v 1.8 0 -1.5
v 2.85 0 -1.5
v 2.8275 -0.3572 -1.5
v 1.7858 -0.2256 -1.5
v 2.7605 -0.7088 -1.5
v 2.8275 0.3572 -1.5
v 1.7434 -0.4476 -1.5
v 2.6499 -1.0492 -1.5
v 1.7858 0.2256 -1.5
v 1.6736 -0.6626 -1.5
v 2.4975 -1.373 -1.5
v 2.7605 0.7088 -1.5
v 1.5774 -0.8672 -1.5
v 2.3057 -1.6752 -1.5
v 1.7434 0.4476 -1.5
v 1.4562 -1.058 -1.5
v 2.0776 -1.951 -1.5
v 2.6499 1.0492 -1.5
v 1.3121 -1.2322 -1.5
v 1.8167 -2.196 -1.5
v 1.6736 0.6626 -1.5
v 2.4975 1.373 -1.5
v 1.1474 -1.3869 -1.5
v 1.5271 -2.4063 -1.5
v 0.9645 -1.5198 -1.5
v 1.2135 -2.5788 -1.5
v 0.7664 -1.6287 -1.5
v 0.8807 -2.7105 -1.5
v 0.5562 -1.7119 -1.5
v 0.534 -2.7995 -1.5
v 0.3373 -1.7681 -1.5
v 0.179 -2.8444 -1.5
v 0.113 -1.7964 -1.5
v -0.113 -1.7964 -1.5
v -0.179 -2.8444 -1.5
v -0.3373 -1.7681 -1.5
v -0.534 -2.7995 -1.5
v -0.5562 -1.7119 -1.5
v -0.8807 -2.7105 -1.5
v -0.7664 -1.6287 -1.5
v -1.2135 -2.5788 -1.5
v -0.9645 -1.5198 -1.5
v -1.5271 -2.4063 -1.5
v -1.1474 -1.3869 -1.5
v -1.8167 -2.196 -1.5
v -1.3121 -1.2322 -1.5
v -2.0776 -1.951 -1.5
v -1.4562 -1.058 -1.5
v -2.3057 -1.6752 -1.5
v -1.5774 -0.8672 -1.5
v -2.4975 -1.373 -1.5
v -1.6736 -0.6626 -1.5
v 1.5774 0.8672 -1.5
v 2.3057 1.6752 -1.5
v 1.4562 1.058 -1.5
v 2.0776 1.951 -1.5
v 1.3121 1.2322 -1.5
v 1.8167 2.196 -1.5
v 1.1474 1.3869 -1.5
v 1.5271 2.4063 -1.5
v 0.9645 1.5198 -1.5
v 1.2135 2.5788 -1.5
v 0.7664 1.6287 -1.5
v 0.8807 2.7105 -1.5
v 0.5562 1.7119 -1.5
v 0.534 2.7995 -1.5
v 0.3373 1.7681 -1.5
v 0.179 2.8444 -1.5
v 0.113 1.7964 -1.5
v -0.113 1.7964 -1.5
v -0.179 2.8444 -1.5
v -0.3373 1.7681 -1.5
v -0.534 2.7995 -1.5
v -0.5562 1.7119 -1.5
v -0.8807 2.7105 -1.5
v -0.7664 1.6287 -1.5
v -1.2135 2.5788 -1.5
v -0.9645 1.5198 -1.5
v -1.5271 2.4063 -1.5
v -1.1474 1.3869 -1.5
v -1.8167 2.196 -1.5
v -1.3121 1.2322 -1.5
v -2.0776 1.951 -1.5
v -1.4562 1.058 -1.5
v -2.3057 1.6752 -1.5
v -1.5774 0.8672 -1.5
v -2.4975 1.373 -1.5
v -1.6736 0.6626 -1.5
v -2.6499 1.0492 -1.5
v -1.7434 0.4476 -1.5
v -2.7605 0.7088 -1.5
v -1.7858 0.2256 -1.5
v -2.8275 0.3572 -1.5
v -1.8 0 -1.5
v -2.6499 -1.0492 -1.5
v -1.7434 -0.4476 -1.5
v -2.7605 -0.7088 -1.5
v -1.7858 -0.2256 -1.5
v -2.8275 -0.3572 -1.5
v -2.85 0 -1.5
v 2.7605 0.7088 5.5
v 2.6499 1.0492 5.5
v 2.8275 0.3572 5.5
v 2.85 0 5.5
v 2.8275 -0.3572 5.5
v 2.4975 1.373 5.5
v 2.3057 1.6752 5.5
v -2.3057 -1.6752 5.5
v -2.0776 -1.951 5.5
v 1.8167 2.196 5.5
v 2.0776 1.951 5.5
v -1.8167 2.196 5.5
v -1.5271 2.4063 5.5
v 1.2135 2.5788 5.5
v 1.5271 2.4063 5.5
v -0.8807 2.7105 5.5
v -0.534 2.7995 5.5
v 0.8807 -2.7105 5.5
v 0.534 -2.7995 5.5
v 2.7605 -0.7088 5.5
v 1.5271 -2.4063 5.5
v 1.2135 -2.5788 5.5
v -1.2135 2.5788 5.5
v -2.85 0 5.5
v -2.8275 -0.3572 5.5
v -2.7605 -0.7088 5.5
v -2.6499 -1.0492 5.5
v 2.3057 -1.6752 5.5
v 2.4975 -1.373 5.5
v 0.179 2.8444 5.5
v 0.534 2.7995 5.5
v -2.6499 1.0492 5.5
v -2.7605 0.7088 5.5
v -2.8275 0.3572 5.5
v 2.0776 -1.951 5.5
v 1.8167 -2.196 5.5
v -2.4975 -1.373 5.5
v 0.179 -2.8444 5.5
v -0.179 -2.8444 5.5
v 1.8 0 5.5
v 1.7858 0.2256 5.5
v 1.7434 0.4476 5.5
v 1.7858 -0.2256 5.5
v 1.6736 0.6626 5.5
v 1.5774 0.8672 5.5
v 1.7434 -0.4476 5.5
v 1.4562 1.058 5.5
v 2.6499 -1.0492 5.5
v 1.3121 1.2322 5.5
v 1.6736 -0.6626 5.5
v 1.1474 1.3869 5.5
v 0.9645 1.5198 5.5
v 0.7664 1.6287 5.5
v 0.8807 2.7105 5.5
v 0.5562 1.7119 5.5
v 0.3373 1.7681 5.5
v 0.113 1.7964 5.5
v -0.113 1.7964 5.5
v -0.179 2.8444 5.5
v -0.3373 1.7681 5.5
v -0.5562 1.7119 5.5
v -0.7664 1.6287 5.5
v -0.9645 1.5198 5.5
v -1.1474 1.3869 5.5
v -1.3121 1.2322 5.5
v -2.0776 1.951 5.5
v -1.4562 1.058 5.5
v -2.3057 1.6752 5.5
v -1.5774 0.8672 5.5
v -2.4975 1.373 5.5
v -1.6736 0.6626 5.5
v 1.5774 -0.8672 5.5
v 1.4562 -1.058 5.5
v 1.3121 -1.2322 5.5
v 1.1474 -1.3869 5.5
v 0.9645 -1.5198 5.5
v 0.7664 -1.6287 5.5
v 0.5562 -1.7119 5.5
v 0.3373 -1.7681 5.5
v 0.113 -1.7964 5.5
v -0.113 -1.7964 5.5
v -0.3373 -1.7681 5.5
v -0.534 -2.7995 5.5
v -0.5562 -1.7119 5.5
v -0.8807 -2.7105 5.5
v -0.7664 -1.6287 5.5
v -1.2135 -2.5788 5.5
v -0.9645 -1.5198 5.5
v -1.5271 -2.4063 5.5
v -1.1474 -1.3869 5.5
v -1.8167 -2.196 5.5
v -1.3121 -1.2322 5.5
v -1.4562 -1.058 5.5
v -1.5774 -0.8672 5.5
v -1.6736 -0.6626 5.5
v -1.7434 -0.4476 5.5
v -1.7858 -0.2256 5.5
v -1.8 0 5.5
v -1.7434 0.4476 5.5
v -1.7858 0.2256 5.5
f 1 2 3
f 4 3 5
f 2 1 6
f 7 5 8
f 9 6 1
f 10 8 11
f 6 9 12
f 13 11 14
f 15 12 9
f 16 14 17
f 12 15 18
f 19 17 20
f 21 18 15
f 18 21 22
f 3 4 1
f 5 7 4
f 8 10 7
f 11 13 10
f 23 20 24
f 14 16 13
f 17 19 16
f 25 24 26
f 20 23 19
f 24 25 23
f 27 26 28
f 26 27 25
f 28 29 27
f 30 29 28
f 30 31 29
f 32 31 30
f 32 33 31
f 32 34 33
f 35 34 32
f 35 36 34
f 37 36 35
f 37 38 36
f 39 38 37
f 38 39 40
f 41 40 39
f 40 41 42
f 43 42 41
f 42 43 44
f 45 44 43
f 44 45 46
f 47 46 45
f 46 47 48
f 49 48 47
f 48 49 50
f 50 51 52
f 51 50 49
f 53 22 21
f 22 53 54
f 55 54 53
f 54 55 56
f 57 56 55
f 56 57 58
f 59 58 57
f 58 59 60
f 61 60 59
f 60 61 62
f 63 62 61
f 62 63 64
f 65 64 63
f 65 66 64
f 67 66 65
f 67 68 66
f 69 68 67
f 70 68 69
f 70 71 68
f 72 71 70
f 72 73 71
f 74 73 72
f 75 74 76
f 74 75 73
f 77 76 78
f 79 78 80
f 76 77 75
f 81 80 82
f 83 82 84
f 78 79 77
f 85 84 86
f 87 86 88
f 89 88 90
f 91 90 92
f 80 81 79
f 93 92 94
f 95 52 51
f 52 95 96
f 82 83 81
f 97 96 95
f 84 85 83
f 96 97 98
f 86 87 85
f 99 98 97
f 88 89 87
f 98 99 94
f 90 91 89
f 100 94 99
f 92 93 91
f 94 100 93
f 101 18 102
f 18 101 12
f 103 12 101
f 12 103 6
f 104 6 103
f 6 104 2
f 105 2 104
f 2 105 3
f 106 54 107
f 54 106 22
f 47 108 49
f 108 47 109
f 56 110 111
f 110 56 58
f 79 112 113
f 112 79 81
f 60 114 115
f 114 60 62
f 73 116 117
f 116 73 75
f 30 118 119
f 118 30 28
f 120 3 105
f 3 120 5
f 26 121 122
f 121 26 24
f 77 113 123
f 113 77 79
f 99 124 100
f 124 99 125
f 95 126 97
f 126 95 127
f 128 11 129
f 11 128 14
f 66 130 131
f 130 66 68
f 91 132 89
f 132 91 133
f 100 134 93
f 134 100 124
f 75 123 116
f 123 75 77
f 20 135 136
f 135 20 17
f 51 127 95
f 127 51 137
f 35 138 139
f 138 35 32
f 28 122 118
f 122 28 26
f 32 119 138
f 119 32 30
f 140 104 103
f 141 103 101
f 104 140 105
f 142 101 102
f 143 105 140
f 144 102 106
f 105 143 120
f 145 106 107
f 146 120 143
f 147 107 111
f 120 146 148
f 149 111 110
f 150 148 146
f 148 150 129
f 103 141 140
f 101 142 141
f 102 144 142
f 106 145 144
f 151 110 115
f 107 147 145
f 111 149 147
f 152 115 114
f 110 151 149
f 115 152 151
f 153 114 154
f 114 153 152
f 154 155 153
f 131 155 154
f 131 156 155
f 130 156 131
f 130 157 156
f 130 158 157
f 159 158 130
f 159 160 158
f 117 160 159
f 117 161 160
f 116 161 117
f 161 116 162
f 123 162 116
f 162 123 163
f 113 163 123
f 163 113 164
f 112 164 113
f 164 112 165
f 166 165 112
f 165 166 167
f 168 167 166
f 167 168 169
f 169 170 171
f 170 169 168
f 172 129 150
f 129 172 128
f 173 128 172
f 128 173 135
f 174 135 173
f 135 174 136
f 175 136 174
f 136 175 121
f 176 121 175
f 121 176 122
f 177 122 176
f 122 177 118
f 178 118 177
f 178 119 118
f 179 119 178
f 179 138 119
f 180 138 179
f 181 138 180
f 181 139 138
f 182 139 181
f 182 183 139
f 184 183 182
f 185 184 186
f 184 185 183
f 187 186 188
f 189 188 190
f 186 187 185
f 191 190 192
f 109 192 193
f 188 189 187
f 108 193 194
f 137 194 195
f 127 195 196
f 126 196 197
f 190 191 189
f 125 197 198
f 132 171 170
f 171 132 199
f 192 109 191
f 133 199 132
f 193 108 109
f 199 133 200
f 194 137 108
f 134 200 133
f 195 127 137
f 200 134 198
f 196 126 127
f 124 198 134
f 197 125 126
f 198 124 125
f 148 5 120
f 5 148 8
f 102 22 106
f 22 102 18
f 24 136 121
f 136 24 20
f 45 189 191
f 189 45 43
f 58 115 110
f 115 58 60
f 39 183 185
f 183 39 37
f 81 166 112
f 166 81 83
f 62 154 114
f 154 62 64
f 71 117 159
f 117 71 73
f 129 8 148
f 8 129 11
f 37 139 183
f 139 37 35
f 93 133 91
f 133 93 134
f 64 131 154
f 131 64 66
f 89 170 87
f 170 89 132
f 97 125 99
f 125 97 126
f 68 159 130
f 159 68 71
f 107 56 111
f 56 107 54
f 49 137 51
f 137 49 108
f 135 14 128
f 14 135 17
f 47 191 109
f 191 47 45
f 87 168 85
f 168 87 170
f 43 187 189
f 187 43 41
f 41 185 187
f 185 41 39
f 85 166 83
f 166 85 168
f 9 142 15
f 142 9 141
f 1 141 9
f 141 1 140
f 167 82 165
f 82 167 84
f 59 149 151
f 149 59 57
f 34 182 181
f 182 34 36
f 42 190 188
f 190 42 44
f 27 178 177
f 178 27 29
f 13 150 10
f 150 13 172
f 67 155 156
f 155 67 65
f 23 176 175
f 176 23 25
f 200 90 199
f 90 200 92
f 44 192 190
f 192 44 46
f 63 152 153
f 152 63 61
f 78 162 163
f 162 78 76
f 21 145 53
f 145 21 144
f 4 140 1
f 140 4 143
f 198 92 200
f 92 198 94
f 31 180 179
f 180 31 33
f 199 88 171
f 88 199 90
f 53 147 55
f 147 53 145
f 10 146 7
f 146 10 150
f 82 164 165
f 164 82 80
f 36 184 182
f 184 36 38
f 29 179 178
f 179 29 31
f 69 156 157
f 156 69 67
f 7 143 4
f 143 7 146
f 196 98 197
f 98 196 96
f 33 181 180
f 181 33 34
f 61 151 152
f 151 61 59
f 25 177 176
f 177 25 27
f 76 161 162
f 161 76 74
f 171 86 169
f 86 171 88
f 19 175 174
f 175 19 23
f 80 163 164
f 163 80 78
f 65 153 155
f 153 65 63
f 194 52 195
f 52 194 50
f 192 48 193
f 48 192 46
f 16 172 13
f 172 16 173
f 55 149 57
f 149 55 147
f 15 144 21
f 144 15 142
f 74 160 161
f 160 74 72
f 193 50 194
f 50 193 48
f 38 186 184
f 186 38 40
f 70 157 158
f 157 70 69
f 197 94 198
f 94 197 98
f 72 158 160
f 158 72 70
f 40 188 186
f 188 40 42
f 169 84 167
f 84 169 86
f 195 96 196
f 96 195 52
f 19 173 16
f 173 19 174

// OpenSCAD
$fn = 50;


difference() {
	union() {
		translate(v = [0, 0, -1.5000000000]) {
			cylinder(h = 3, r = 1.0000000000);
		}
		translate(v = [0, 0, -1.5000000000]) {
			cylinder(h = 7, r = 2.8500000000);
		}
	}
	union() {
		translate(v = [0, 0, -100.0000000000]) {
			cylinder(h = 200, r = 1.8000000000);
		}
	}
}
